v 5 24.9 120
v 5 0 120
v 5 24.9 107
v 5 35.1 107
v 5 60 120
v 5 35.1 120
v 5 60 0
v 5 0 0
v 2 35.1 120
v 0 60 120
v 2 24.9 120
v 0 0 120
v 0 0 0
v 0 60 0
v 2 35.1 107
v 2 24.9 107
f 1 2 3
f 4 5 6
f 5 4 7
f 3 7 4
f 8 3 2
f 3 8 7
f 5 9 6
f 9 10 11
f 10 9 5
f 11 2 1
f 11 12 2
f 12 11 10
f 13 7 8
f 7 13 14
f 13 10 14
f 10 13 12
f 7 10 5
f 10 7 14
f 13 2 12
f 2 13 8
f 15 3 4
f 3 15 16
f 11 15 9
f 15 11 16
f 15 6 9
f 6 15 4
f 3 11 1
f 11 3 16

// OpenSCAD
LeftWall();
module LeftWall(){
    difference(){
        cube([5,60,120]);        
        
        translate([2,24.9,107])
        #cube([4.5,10.2,15]);
    }
}
